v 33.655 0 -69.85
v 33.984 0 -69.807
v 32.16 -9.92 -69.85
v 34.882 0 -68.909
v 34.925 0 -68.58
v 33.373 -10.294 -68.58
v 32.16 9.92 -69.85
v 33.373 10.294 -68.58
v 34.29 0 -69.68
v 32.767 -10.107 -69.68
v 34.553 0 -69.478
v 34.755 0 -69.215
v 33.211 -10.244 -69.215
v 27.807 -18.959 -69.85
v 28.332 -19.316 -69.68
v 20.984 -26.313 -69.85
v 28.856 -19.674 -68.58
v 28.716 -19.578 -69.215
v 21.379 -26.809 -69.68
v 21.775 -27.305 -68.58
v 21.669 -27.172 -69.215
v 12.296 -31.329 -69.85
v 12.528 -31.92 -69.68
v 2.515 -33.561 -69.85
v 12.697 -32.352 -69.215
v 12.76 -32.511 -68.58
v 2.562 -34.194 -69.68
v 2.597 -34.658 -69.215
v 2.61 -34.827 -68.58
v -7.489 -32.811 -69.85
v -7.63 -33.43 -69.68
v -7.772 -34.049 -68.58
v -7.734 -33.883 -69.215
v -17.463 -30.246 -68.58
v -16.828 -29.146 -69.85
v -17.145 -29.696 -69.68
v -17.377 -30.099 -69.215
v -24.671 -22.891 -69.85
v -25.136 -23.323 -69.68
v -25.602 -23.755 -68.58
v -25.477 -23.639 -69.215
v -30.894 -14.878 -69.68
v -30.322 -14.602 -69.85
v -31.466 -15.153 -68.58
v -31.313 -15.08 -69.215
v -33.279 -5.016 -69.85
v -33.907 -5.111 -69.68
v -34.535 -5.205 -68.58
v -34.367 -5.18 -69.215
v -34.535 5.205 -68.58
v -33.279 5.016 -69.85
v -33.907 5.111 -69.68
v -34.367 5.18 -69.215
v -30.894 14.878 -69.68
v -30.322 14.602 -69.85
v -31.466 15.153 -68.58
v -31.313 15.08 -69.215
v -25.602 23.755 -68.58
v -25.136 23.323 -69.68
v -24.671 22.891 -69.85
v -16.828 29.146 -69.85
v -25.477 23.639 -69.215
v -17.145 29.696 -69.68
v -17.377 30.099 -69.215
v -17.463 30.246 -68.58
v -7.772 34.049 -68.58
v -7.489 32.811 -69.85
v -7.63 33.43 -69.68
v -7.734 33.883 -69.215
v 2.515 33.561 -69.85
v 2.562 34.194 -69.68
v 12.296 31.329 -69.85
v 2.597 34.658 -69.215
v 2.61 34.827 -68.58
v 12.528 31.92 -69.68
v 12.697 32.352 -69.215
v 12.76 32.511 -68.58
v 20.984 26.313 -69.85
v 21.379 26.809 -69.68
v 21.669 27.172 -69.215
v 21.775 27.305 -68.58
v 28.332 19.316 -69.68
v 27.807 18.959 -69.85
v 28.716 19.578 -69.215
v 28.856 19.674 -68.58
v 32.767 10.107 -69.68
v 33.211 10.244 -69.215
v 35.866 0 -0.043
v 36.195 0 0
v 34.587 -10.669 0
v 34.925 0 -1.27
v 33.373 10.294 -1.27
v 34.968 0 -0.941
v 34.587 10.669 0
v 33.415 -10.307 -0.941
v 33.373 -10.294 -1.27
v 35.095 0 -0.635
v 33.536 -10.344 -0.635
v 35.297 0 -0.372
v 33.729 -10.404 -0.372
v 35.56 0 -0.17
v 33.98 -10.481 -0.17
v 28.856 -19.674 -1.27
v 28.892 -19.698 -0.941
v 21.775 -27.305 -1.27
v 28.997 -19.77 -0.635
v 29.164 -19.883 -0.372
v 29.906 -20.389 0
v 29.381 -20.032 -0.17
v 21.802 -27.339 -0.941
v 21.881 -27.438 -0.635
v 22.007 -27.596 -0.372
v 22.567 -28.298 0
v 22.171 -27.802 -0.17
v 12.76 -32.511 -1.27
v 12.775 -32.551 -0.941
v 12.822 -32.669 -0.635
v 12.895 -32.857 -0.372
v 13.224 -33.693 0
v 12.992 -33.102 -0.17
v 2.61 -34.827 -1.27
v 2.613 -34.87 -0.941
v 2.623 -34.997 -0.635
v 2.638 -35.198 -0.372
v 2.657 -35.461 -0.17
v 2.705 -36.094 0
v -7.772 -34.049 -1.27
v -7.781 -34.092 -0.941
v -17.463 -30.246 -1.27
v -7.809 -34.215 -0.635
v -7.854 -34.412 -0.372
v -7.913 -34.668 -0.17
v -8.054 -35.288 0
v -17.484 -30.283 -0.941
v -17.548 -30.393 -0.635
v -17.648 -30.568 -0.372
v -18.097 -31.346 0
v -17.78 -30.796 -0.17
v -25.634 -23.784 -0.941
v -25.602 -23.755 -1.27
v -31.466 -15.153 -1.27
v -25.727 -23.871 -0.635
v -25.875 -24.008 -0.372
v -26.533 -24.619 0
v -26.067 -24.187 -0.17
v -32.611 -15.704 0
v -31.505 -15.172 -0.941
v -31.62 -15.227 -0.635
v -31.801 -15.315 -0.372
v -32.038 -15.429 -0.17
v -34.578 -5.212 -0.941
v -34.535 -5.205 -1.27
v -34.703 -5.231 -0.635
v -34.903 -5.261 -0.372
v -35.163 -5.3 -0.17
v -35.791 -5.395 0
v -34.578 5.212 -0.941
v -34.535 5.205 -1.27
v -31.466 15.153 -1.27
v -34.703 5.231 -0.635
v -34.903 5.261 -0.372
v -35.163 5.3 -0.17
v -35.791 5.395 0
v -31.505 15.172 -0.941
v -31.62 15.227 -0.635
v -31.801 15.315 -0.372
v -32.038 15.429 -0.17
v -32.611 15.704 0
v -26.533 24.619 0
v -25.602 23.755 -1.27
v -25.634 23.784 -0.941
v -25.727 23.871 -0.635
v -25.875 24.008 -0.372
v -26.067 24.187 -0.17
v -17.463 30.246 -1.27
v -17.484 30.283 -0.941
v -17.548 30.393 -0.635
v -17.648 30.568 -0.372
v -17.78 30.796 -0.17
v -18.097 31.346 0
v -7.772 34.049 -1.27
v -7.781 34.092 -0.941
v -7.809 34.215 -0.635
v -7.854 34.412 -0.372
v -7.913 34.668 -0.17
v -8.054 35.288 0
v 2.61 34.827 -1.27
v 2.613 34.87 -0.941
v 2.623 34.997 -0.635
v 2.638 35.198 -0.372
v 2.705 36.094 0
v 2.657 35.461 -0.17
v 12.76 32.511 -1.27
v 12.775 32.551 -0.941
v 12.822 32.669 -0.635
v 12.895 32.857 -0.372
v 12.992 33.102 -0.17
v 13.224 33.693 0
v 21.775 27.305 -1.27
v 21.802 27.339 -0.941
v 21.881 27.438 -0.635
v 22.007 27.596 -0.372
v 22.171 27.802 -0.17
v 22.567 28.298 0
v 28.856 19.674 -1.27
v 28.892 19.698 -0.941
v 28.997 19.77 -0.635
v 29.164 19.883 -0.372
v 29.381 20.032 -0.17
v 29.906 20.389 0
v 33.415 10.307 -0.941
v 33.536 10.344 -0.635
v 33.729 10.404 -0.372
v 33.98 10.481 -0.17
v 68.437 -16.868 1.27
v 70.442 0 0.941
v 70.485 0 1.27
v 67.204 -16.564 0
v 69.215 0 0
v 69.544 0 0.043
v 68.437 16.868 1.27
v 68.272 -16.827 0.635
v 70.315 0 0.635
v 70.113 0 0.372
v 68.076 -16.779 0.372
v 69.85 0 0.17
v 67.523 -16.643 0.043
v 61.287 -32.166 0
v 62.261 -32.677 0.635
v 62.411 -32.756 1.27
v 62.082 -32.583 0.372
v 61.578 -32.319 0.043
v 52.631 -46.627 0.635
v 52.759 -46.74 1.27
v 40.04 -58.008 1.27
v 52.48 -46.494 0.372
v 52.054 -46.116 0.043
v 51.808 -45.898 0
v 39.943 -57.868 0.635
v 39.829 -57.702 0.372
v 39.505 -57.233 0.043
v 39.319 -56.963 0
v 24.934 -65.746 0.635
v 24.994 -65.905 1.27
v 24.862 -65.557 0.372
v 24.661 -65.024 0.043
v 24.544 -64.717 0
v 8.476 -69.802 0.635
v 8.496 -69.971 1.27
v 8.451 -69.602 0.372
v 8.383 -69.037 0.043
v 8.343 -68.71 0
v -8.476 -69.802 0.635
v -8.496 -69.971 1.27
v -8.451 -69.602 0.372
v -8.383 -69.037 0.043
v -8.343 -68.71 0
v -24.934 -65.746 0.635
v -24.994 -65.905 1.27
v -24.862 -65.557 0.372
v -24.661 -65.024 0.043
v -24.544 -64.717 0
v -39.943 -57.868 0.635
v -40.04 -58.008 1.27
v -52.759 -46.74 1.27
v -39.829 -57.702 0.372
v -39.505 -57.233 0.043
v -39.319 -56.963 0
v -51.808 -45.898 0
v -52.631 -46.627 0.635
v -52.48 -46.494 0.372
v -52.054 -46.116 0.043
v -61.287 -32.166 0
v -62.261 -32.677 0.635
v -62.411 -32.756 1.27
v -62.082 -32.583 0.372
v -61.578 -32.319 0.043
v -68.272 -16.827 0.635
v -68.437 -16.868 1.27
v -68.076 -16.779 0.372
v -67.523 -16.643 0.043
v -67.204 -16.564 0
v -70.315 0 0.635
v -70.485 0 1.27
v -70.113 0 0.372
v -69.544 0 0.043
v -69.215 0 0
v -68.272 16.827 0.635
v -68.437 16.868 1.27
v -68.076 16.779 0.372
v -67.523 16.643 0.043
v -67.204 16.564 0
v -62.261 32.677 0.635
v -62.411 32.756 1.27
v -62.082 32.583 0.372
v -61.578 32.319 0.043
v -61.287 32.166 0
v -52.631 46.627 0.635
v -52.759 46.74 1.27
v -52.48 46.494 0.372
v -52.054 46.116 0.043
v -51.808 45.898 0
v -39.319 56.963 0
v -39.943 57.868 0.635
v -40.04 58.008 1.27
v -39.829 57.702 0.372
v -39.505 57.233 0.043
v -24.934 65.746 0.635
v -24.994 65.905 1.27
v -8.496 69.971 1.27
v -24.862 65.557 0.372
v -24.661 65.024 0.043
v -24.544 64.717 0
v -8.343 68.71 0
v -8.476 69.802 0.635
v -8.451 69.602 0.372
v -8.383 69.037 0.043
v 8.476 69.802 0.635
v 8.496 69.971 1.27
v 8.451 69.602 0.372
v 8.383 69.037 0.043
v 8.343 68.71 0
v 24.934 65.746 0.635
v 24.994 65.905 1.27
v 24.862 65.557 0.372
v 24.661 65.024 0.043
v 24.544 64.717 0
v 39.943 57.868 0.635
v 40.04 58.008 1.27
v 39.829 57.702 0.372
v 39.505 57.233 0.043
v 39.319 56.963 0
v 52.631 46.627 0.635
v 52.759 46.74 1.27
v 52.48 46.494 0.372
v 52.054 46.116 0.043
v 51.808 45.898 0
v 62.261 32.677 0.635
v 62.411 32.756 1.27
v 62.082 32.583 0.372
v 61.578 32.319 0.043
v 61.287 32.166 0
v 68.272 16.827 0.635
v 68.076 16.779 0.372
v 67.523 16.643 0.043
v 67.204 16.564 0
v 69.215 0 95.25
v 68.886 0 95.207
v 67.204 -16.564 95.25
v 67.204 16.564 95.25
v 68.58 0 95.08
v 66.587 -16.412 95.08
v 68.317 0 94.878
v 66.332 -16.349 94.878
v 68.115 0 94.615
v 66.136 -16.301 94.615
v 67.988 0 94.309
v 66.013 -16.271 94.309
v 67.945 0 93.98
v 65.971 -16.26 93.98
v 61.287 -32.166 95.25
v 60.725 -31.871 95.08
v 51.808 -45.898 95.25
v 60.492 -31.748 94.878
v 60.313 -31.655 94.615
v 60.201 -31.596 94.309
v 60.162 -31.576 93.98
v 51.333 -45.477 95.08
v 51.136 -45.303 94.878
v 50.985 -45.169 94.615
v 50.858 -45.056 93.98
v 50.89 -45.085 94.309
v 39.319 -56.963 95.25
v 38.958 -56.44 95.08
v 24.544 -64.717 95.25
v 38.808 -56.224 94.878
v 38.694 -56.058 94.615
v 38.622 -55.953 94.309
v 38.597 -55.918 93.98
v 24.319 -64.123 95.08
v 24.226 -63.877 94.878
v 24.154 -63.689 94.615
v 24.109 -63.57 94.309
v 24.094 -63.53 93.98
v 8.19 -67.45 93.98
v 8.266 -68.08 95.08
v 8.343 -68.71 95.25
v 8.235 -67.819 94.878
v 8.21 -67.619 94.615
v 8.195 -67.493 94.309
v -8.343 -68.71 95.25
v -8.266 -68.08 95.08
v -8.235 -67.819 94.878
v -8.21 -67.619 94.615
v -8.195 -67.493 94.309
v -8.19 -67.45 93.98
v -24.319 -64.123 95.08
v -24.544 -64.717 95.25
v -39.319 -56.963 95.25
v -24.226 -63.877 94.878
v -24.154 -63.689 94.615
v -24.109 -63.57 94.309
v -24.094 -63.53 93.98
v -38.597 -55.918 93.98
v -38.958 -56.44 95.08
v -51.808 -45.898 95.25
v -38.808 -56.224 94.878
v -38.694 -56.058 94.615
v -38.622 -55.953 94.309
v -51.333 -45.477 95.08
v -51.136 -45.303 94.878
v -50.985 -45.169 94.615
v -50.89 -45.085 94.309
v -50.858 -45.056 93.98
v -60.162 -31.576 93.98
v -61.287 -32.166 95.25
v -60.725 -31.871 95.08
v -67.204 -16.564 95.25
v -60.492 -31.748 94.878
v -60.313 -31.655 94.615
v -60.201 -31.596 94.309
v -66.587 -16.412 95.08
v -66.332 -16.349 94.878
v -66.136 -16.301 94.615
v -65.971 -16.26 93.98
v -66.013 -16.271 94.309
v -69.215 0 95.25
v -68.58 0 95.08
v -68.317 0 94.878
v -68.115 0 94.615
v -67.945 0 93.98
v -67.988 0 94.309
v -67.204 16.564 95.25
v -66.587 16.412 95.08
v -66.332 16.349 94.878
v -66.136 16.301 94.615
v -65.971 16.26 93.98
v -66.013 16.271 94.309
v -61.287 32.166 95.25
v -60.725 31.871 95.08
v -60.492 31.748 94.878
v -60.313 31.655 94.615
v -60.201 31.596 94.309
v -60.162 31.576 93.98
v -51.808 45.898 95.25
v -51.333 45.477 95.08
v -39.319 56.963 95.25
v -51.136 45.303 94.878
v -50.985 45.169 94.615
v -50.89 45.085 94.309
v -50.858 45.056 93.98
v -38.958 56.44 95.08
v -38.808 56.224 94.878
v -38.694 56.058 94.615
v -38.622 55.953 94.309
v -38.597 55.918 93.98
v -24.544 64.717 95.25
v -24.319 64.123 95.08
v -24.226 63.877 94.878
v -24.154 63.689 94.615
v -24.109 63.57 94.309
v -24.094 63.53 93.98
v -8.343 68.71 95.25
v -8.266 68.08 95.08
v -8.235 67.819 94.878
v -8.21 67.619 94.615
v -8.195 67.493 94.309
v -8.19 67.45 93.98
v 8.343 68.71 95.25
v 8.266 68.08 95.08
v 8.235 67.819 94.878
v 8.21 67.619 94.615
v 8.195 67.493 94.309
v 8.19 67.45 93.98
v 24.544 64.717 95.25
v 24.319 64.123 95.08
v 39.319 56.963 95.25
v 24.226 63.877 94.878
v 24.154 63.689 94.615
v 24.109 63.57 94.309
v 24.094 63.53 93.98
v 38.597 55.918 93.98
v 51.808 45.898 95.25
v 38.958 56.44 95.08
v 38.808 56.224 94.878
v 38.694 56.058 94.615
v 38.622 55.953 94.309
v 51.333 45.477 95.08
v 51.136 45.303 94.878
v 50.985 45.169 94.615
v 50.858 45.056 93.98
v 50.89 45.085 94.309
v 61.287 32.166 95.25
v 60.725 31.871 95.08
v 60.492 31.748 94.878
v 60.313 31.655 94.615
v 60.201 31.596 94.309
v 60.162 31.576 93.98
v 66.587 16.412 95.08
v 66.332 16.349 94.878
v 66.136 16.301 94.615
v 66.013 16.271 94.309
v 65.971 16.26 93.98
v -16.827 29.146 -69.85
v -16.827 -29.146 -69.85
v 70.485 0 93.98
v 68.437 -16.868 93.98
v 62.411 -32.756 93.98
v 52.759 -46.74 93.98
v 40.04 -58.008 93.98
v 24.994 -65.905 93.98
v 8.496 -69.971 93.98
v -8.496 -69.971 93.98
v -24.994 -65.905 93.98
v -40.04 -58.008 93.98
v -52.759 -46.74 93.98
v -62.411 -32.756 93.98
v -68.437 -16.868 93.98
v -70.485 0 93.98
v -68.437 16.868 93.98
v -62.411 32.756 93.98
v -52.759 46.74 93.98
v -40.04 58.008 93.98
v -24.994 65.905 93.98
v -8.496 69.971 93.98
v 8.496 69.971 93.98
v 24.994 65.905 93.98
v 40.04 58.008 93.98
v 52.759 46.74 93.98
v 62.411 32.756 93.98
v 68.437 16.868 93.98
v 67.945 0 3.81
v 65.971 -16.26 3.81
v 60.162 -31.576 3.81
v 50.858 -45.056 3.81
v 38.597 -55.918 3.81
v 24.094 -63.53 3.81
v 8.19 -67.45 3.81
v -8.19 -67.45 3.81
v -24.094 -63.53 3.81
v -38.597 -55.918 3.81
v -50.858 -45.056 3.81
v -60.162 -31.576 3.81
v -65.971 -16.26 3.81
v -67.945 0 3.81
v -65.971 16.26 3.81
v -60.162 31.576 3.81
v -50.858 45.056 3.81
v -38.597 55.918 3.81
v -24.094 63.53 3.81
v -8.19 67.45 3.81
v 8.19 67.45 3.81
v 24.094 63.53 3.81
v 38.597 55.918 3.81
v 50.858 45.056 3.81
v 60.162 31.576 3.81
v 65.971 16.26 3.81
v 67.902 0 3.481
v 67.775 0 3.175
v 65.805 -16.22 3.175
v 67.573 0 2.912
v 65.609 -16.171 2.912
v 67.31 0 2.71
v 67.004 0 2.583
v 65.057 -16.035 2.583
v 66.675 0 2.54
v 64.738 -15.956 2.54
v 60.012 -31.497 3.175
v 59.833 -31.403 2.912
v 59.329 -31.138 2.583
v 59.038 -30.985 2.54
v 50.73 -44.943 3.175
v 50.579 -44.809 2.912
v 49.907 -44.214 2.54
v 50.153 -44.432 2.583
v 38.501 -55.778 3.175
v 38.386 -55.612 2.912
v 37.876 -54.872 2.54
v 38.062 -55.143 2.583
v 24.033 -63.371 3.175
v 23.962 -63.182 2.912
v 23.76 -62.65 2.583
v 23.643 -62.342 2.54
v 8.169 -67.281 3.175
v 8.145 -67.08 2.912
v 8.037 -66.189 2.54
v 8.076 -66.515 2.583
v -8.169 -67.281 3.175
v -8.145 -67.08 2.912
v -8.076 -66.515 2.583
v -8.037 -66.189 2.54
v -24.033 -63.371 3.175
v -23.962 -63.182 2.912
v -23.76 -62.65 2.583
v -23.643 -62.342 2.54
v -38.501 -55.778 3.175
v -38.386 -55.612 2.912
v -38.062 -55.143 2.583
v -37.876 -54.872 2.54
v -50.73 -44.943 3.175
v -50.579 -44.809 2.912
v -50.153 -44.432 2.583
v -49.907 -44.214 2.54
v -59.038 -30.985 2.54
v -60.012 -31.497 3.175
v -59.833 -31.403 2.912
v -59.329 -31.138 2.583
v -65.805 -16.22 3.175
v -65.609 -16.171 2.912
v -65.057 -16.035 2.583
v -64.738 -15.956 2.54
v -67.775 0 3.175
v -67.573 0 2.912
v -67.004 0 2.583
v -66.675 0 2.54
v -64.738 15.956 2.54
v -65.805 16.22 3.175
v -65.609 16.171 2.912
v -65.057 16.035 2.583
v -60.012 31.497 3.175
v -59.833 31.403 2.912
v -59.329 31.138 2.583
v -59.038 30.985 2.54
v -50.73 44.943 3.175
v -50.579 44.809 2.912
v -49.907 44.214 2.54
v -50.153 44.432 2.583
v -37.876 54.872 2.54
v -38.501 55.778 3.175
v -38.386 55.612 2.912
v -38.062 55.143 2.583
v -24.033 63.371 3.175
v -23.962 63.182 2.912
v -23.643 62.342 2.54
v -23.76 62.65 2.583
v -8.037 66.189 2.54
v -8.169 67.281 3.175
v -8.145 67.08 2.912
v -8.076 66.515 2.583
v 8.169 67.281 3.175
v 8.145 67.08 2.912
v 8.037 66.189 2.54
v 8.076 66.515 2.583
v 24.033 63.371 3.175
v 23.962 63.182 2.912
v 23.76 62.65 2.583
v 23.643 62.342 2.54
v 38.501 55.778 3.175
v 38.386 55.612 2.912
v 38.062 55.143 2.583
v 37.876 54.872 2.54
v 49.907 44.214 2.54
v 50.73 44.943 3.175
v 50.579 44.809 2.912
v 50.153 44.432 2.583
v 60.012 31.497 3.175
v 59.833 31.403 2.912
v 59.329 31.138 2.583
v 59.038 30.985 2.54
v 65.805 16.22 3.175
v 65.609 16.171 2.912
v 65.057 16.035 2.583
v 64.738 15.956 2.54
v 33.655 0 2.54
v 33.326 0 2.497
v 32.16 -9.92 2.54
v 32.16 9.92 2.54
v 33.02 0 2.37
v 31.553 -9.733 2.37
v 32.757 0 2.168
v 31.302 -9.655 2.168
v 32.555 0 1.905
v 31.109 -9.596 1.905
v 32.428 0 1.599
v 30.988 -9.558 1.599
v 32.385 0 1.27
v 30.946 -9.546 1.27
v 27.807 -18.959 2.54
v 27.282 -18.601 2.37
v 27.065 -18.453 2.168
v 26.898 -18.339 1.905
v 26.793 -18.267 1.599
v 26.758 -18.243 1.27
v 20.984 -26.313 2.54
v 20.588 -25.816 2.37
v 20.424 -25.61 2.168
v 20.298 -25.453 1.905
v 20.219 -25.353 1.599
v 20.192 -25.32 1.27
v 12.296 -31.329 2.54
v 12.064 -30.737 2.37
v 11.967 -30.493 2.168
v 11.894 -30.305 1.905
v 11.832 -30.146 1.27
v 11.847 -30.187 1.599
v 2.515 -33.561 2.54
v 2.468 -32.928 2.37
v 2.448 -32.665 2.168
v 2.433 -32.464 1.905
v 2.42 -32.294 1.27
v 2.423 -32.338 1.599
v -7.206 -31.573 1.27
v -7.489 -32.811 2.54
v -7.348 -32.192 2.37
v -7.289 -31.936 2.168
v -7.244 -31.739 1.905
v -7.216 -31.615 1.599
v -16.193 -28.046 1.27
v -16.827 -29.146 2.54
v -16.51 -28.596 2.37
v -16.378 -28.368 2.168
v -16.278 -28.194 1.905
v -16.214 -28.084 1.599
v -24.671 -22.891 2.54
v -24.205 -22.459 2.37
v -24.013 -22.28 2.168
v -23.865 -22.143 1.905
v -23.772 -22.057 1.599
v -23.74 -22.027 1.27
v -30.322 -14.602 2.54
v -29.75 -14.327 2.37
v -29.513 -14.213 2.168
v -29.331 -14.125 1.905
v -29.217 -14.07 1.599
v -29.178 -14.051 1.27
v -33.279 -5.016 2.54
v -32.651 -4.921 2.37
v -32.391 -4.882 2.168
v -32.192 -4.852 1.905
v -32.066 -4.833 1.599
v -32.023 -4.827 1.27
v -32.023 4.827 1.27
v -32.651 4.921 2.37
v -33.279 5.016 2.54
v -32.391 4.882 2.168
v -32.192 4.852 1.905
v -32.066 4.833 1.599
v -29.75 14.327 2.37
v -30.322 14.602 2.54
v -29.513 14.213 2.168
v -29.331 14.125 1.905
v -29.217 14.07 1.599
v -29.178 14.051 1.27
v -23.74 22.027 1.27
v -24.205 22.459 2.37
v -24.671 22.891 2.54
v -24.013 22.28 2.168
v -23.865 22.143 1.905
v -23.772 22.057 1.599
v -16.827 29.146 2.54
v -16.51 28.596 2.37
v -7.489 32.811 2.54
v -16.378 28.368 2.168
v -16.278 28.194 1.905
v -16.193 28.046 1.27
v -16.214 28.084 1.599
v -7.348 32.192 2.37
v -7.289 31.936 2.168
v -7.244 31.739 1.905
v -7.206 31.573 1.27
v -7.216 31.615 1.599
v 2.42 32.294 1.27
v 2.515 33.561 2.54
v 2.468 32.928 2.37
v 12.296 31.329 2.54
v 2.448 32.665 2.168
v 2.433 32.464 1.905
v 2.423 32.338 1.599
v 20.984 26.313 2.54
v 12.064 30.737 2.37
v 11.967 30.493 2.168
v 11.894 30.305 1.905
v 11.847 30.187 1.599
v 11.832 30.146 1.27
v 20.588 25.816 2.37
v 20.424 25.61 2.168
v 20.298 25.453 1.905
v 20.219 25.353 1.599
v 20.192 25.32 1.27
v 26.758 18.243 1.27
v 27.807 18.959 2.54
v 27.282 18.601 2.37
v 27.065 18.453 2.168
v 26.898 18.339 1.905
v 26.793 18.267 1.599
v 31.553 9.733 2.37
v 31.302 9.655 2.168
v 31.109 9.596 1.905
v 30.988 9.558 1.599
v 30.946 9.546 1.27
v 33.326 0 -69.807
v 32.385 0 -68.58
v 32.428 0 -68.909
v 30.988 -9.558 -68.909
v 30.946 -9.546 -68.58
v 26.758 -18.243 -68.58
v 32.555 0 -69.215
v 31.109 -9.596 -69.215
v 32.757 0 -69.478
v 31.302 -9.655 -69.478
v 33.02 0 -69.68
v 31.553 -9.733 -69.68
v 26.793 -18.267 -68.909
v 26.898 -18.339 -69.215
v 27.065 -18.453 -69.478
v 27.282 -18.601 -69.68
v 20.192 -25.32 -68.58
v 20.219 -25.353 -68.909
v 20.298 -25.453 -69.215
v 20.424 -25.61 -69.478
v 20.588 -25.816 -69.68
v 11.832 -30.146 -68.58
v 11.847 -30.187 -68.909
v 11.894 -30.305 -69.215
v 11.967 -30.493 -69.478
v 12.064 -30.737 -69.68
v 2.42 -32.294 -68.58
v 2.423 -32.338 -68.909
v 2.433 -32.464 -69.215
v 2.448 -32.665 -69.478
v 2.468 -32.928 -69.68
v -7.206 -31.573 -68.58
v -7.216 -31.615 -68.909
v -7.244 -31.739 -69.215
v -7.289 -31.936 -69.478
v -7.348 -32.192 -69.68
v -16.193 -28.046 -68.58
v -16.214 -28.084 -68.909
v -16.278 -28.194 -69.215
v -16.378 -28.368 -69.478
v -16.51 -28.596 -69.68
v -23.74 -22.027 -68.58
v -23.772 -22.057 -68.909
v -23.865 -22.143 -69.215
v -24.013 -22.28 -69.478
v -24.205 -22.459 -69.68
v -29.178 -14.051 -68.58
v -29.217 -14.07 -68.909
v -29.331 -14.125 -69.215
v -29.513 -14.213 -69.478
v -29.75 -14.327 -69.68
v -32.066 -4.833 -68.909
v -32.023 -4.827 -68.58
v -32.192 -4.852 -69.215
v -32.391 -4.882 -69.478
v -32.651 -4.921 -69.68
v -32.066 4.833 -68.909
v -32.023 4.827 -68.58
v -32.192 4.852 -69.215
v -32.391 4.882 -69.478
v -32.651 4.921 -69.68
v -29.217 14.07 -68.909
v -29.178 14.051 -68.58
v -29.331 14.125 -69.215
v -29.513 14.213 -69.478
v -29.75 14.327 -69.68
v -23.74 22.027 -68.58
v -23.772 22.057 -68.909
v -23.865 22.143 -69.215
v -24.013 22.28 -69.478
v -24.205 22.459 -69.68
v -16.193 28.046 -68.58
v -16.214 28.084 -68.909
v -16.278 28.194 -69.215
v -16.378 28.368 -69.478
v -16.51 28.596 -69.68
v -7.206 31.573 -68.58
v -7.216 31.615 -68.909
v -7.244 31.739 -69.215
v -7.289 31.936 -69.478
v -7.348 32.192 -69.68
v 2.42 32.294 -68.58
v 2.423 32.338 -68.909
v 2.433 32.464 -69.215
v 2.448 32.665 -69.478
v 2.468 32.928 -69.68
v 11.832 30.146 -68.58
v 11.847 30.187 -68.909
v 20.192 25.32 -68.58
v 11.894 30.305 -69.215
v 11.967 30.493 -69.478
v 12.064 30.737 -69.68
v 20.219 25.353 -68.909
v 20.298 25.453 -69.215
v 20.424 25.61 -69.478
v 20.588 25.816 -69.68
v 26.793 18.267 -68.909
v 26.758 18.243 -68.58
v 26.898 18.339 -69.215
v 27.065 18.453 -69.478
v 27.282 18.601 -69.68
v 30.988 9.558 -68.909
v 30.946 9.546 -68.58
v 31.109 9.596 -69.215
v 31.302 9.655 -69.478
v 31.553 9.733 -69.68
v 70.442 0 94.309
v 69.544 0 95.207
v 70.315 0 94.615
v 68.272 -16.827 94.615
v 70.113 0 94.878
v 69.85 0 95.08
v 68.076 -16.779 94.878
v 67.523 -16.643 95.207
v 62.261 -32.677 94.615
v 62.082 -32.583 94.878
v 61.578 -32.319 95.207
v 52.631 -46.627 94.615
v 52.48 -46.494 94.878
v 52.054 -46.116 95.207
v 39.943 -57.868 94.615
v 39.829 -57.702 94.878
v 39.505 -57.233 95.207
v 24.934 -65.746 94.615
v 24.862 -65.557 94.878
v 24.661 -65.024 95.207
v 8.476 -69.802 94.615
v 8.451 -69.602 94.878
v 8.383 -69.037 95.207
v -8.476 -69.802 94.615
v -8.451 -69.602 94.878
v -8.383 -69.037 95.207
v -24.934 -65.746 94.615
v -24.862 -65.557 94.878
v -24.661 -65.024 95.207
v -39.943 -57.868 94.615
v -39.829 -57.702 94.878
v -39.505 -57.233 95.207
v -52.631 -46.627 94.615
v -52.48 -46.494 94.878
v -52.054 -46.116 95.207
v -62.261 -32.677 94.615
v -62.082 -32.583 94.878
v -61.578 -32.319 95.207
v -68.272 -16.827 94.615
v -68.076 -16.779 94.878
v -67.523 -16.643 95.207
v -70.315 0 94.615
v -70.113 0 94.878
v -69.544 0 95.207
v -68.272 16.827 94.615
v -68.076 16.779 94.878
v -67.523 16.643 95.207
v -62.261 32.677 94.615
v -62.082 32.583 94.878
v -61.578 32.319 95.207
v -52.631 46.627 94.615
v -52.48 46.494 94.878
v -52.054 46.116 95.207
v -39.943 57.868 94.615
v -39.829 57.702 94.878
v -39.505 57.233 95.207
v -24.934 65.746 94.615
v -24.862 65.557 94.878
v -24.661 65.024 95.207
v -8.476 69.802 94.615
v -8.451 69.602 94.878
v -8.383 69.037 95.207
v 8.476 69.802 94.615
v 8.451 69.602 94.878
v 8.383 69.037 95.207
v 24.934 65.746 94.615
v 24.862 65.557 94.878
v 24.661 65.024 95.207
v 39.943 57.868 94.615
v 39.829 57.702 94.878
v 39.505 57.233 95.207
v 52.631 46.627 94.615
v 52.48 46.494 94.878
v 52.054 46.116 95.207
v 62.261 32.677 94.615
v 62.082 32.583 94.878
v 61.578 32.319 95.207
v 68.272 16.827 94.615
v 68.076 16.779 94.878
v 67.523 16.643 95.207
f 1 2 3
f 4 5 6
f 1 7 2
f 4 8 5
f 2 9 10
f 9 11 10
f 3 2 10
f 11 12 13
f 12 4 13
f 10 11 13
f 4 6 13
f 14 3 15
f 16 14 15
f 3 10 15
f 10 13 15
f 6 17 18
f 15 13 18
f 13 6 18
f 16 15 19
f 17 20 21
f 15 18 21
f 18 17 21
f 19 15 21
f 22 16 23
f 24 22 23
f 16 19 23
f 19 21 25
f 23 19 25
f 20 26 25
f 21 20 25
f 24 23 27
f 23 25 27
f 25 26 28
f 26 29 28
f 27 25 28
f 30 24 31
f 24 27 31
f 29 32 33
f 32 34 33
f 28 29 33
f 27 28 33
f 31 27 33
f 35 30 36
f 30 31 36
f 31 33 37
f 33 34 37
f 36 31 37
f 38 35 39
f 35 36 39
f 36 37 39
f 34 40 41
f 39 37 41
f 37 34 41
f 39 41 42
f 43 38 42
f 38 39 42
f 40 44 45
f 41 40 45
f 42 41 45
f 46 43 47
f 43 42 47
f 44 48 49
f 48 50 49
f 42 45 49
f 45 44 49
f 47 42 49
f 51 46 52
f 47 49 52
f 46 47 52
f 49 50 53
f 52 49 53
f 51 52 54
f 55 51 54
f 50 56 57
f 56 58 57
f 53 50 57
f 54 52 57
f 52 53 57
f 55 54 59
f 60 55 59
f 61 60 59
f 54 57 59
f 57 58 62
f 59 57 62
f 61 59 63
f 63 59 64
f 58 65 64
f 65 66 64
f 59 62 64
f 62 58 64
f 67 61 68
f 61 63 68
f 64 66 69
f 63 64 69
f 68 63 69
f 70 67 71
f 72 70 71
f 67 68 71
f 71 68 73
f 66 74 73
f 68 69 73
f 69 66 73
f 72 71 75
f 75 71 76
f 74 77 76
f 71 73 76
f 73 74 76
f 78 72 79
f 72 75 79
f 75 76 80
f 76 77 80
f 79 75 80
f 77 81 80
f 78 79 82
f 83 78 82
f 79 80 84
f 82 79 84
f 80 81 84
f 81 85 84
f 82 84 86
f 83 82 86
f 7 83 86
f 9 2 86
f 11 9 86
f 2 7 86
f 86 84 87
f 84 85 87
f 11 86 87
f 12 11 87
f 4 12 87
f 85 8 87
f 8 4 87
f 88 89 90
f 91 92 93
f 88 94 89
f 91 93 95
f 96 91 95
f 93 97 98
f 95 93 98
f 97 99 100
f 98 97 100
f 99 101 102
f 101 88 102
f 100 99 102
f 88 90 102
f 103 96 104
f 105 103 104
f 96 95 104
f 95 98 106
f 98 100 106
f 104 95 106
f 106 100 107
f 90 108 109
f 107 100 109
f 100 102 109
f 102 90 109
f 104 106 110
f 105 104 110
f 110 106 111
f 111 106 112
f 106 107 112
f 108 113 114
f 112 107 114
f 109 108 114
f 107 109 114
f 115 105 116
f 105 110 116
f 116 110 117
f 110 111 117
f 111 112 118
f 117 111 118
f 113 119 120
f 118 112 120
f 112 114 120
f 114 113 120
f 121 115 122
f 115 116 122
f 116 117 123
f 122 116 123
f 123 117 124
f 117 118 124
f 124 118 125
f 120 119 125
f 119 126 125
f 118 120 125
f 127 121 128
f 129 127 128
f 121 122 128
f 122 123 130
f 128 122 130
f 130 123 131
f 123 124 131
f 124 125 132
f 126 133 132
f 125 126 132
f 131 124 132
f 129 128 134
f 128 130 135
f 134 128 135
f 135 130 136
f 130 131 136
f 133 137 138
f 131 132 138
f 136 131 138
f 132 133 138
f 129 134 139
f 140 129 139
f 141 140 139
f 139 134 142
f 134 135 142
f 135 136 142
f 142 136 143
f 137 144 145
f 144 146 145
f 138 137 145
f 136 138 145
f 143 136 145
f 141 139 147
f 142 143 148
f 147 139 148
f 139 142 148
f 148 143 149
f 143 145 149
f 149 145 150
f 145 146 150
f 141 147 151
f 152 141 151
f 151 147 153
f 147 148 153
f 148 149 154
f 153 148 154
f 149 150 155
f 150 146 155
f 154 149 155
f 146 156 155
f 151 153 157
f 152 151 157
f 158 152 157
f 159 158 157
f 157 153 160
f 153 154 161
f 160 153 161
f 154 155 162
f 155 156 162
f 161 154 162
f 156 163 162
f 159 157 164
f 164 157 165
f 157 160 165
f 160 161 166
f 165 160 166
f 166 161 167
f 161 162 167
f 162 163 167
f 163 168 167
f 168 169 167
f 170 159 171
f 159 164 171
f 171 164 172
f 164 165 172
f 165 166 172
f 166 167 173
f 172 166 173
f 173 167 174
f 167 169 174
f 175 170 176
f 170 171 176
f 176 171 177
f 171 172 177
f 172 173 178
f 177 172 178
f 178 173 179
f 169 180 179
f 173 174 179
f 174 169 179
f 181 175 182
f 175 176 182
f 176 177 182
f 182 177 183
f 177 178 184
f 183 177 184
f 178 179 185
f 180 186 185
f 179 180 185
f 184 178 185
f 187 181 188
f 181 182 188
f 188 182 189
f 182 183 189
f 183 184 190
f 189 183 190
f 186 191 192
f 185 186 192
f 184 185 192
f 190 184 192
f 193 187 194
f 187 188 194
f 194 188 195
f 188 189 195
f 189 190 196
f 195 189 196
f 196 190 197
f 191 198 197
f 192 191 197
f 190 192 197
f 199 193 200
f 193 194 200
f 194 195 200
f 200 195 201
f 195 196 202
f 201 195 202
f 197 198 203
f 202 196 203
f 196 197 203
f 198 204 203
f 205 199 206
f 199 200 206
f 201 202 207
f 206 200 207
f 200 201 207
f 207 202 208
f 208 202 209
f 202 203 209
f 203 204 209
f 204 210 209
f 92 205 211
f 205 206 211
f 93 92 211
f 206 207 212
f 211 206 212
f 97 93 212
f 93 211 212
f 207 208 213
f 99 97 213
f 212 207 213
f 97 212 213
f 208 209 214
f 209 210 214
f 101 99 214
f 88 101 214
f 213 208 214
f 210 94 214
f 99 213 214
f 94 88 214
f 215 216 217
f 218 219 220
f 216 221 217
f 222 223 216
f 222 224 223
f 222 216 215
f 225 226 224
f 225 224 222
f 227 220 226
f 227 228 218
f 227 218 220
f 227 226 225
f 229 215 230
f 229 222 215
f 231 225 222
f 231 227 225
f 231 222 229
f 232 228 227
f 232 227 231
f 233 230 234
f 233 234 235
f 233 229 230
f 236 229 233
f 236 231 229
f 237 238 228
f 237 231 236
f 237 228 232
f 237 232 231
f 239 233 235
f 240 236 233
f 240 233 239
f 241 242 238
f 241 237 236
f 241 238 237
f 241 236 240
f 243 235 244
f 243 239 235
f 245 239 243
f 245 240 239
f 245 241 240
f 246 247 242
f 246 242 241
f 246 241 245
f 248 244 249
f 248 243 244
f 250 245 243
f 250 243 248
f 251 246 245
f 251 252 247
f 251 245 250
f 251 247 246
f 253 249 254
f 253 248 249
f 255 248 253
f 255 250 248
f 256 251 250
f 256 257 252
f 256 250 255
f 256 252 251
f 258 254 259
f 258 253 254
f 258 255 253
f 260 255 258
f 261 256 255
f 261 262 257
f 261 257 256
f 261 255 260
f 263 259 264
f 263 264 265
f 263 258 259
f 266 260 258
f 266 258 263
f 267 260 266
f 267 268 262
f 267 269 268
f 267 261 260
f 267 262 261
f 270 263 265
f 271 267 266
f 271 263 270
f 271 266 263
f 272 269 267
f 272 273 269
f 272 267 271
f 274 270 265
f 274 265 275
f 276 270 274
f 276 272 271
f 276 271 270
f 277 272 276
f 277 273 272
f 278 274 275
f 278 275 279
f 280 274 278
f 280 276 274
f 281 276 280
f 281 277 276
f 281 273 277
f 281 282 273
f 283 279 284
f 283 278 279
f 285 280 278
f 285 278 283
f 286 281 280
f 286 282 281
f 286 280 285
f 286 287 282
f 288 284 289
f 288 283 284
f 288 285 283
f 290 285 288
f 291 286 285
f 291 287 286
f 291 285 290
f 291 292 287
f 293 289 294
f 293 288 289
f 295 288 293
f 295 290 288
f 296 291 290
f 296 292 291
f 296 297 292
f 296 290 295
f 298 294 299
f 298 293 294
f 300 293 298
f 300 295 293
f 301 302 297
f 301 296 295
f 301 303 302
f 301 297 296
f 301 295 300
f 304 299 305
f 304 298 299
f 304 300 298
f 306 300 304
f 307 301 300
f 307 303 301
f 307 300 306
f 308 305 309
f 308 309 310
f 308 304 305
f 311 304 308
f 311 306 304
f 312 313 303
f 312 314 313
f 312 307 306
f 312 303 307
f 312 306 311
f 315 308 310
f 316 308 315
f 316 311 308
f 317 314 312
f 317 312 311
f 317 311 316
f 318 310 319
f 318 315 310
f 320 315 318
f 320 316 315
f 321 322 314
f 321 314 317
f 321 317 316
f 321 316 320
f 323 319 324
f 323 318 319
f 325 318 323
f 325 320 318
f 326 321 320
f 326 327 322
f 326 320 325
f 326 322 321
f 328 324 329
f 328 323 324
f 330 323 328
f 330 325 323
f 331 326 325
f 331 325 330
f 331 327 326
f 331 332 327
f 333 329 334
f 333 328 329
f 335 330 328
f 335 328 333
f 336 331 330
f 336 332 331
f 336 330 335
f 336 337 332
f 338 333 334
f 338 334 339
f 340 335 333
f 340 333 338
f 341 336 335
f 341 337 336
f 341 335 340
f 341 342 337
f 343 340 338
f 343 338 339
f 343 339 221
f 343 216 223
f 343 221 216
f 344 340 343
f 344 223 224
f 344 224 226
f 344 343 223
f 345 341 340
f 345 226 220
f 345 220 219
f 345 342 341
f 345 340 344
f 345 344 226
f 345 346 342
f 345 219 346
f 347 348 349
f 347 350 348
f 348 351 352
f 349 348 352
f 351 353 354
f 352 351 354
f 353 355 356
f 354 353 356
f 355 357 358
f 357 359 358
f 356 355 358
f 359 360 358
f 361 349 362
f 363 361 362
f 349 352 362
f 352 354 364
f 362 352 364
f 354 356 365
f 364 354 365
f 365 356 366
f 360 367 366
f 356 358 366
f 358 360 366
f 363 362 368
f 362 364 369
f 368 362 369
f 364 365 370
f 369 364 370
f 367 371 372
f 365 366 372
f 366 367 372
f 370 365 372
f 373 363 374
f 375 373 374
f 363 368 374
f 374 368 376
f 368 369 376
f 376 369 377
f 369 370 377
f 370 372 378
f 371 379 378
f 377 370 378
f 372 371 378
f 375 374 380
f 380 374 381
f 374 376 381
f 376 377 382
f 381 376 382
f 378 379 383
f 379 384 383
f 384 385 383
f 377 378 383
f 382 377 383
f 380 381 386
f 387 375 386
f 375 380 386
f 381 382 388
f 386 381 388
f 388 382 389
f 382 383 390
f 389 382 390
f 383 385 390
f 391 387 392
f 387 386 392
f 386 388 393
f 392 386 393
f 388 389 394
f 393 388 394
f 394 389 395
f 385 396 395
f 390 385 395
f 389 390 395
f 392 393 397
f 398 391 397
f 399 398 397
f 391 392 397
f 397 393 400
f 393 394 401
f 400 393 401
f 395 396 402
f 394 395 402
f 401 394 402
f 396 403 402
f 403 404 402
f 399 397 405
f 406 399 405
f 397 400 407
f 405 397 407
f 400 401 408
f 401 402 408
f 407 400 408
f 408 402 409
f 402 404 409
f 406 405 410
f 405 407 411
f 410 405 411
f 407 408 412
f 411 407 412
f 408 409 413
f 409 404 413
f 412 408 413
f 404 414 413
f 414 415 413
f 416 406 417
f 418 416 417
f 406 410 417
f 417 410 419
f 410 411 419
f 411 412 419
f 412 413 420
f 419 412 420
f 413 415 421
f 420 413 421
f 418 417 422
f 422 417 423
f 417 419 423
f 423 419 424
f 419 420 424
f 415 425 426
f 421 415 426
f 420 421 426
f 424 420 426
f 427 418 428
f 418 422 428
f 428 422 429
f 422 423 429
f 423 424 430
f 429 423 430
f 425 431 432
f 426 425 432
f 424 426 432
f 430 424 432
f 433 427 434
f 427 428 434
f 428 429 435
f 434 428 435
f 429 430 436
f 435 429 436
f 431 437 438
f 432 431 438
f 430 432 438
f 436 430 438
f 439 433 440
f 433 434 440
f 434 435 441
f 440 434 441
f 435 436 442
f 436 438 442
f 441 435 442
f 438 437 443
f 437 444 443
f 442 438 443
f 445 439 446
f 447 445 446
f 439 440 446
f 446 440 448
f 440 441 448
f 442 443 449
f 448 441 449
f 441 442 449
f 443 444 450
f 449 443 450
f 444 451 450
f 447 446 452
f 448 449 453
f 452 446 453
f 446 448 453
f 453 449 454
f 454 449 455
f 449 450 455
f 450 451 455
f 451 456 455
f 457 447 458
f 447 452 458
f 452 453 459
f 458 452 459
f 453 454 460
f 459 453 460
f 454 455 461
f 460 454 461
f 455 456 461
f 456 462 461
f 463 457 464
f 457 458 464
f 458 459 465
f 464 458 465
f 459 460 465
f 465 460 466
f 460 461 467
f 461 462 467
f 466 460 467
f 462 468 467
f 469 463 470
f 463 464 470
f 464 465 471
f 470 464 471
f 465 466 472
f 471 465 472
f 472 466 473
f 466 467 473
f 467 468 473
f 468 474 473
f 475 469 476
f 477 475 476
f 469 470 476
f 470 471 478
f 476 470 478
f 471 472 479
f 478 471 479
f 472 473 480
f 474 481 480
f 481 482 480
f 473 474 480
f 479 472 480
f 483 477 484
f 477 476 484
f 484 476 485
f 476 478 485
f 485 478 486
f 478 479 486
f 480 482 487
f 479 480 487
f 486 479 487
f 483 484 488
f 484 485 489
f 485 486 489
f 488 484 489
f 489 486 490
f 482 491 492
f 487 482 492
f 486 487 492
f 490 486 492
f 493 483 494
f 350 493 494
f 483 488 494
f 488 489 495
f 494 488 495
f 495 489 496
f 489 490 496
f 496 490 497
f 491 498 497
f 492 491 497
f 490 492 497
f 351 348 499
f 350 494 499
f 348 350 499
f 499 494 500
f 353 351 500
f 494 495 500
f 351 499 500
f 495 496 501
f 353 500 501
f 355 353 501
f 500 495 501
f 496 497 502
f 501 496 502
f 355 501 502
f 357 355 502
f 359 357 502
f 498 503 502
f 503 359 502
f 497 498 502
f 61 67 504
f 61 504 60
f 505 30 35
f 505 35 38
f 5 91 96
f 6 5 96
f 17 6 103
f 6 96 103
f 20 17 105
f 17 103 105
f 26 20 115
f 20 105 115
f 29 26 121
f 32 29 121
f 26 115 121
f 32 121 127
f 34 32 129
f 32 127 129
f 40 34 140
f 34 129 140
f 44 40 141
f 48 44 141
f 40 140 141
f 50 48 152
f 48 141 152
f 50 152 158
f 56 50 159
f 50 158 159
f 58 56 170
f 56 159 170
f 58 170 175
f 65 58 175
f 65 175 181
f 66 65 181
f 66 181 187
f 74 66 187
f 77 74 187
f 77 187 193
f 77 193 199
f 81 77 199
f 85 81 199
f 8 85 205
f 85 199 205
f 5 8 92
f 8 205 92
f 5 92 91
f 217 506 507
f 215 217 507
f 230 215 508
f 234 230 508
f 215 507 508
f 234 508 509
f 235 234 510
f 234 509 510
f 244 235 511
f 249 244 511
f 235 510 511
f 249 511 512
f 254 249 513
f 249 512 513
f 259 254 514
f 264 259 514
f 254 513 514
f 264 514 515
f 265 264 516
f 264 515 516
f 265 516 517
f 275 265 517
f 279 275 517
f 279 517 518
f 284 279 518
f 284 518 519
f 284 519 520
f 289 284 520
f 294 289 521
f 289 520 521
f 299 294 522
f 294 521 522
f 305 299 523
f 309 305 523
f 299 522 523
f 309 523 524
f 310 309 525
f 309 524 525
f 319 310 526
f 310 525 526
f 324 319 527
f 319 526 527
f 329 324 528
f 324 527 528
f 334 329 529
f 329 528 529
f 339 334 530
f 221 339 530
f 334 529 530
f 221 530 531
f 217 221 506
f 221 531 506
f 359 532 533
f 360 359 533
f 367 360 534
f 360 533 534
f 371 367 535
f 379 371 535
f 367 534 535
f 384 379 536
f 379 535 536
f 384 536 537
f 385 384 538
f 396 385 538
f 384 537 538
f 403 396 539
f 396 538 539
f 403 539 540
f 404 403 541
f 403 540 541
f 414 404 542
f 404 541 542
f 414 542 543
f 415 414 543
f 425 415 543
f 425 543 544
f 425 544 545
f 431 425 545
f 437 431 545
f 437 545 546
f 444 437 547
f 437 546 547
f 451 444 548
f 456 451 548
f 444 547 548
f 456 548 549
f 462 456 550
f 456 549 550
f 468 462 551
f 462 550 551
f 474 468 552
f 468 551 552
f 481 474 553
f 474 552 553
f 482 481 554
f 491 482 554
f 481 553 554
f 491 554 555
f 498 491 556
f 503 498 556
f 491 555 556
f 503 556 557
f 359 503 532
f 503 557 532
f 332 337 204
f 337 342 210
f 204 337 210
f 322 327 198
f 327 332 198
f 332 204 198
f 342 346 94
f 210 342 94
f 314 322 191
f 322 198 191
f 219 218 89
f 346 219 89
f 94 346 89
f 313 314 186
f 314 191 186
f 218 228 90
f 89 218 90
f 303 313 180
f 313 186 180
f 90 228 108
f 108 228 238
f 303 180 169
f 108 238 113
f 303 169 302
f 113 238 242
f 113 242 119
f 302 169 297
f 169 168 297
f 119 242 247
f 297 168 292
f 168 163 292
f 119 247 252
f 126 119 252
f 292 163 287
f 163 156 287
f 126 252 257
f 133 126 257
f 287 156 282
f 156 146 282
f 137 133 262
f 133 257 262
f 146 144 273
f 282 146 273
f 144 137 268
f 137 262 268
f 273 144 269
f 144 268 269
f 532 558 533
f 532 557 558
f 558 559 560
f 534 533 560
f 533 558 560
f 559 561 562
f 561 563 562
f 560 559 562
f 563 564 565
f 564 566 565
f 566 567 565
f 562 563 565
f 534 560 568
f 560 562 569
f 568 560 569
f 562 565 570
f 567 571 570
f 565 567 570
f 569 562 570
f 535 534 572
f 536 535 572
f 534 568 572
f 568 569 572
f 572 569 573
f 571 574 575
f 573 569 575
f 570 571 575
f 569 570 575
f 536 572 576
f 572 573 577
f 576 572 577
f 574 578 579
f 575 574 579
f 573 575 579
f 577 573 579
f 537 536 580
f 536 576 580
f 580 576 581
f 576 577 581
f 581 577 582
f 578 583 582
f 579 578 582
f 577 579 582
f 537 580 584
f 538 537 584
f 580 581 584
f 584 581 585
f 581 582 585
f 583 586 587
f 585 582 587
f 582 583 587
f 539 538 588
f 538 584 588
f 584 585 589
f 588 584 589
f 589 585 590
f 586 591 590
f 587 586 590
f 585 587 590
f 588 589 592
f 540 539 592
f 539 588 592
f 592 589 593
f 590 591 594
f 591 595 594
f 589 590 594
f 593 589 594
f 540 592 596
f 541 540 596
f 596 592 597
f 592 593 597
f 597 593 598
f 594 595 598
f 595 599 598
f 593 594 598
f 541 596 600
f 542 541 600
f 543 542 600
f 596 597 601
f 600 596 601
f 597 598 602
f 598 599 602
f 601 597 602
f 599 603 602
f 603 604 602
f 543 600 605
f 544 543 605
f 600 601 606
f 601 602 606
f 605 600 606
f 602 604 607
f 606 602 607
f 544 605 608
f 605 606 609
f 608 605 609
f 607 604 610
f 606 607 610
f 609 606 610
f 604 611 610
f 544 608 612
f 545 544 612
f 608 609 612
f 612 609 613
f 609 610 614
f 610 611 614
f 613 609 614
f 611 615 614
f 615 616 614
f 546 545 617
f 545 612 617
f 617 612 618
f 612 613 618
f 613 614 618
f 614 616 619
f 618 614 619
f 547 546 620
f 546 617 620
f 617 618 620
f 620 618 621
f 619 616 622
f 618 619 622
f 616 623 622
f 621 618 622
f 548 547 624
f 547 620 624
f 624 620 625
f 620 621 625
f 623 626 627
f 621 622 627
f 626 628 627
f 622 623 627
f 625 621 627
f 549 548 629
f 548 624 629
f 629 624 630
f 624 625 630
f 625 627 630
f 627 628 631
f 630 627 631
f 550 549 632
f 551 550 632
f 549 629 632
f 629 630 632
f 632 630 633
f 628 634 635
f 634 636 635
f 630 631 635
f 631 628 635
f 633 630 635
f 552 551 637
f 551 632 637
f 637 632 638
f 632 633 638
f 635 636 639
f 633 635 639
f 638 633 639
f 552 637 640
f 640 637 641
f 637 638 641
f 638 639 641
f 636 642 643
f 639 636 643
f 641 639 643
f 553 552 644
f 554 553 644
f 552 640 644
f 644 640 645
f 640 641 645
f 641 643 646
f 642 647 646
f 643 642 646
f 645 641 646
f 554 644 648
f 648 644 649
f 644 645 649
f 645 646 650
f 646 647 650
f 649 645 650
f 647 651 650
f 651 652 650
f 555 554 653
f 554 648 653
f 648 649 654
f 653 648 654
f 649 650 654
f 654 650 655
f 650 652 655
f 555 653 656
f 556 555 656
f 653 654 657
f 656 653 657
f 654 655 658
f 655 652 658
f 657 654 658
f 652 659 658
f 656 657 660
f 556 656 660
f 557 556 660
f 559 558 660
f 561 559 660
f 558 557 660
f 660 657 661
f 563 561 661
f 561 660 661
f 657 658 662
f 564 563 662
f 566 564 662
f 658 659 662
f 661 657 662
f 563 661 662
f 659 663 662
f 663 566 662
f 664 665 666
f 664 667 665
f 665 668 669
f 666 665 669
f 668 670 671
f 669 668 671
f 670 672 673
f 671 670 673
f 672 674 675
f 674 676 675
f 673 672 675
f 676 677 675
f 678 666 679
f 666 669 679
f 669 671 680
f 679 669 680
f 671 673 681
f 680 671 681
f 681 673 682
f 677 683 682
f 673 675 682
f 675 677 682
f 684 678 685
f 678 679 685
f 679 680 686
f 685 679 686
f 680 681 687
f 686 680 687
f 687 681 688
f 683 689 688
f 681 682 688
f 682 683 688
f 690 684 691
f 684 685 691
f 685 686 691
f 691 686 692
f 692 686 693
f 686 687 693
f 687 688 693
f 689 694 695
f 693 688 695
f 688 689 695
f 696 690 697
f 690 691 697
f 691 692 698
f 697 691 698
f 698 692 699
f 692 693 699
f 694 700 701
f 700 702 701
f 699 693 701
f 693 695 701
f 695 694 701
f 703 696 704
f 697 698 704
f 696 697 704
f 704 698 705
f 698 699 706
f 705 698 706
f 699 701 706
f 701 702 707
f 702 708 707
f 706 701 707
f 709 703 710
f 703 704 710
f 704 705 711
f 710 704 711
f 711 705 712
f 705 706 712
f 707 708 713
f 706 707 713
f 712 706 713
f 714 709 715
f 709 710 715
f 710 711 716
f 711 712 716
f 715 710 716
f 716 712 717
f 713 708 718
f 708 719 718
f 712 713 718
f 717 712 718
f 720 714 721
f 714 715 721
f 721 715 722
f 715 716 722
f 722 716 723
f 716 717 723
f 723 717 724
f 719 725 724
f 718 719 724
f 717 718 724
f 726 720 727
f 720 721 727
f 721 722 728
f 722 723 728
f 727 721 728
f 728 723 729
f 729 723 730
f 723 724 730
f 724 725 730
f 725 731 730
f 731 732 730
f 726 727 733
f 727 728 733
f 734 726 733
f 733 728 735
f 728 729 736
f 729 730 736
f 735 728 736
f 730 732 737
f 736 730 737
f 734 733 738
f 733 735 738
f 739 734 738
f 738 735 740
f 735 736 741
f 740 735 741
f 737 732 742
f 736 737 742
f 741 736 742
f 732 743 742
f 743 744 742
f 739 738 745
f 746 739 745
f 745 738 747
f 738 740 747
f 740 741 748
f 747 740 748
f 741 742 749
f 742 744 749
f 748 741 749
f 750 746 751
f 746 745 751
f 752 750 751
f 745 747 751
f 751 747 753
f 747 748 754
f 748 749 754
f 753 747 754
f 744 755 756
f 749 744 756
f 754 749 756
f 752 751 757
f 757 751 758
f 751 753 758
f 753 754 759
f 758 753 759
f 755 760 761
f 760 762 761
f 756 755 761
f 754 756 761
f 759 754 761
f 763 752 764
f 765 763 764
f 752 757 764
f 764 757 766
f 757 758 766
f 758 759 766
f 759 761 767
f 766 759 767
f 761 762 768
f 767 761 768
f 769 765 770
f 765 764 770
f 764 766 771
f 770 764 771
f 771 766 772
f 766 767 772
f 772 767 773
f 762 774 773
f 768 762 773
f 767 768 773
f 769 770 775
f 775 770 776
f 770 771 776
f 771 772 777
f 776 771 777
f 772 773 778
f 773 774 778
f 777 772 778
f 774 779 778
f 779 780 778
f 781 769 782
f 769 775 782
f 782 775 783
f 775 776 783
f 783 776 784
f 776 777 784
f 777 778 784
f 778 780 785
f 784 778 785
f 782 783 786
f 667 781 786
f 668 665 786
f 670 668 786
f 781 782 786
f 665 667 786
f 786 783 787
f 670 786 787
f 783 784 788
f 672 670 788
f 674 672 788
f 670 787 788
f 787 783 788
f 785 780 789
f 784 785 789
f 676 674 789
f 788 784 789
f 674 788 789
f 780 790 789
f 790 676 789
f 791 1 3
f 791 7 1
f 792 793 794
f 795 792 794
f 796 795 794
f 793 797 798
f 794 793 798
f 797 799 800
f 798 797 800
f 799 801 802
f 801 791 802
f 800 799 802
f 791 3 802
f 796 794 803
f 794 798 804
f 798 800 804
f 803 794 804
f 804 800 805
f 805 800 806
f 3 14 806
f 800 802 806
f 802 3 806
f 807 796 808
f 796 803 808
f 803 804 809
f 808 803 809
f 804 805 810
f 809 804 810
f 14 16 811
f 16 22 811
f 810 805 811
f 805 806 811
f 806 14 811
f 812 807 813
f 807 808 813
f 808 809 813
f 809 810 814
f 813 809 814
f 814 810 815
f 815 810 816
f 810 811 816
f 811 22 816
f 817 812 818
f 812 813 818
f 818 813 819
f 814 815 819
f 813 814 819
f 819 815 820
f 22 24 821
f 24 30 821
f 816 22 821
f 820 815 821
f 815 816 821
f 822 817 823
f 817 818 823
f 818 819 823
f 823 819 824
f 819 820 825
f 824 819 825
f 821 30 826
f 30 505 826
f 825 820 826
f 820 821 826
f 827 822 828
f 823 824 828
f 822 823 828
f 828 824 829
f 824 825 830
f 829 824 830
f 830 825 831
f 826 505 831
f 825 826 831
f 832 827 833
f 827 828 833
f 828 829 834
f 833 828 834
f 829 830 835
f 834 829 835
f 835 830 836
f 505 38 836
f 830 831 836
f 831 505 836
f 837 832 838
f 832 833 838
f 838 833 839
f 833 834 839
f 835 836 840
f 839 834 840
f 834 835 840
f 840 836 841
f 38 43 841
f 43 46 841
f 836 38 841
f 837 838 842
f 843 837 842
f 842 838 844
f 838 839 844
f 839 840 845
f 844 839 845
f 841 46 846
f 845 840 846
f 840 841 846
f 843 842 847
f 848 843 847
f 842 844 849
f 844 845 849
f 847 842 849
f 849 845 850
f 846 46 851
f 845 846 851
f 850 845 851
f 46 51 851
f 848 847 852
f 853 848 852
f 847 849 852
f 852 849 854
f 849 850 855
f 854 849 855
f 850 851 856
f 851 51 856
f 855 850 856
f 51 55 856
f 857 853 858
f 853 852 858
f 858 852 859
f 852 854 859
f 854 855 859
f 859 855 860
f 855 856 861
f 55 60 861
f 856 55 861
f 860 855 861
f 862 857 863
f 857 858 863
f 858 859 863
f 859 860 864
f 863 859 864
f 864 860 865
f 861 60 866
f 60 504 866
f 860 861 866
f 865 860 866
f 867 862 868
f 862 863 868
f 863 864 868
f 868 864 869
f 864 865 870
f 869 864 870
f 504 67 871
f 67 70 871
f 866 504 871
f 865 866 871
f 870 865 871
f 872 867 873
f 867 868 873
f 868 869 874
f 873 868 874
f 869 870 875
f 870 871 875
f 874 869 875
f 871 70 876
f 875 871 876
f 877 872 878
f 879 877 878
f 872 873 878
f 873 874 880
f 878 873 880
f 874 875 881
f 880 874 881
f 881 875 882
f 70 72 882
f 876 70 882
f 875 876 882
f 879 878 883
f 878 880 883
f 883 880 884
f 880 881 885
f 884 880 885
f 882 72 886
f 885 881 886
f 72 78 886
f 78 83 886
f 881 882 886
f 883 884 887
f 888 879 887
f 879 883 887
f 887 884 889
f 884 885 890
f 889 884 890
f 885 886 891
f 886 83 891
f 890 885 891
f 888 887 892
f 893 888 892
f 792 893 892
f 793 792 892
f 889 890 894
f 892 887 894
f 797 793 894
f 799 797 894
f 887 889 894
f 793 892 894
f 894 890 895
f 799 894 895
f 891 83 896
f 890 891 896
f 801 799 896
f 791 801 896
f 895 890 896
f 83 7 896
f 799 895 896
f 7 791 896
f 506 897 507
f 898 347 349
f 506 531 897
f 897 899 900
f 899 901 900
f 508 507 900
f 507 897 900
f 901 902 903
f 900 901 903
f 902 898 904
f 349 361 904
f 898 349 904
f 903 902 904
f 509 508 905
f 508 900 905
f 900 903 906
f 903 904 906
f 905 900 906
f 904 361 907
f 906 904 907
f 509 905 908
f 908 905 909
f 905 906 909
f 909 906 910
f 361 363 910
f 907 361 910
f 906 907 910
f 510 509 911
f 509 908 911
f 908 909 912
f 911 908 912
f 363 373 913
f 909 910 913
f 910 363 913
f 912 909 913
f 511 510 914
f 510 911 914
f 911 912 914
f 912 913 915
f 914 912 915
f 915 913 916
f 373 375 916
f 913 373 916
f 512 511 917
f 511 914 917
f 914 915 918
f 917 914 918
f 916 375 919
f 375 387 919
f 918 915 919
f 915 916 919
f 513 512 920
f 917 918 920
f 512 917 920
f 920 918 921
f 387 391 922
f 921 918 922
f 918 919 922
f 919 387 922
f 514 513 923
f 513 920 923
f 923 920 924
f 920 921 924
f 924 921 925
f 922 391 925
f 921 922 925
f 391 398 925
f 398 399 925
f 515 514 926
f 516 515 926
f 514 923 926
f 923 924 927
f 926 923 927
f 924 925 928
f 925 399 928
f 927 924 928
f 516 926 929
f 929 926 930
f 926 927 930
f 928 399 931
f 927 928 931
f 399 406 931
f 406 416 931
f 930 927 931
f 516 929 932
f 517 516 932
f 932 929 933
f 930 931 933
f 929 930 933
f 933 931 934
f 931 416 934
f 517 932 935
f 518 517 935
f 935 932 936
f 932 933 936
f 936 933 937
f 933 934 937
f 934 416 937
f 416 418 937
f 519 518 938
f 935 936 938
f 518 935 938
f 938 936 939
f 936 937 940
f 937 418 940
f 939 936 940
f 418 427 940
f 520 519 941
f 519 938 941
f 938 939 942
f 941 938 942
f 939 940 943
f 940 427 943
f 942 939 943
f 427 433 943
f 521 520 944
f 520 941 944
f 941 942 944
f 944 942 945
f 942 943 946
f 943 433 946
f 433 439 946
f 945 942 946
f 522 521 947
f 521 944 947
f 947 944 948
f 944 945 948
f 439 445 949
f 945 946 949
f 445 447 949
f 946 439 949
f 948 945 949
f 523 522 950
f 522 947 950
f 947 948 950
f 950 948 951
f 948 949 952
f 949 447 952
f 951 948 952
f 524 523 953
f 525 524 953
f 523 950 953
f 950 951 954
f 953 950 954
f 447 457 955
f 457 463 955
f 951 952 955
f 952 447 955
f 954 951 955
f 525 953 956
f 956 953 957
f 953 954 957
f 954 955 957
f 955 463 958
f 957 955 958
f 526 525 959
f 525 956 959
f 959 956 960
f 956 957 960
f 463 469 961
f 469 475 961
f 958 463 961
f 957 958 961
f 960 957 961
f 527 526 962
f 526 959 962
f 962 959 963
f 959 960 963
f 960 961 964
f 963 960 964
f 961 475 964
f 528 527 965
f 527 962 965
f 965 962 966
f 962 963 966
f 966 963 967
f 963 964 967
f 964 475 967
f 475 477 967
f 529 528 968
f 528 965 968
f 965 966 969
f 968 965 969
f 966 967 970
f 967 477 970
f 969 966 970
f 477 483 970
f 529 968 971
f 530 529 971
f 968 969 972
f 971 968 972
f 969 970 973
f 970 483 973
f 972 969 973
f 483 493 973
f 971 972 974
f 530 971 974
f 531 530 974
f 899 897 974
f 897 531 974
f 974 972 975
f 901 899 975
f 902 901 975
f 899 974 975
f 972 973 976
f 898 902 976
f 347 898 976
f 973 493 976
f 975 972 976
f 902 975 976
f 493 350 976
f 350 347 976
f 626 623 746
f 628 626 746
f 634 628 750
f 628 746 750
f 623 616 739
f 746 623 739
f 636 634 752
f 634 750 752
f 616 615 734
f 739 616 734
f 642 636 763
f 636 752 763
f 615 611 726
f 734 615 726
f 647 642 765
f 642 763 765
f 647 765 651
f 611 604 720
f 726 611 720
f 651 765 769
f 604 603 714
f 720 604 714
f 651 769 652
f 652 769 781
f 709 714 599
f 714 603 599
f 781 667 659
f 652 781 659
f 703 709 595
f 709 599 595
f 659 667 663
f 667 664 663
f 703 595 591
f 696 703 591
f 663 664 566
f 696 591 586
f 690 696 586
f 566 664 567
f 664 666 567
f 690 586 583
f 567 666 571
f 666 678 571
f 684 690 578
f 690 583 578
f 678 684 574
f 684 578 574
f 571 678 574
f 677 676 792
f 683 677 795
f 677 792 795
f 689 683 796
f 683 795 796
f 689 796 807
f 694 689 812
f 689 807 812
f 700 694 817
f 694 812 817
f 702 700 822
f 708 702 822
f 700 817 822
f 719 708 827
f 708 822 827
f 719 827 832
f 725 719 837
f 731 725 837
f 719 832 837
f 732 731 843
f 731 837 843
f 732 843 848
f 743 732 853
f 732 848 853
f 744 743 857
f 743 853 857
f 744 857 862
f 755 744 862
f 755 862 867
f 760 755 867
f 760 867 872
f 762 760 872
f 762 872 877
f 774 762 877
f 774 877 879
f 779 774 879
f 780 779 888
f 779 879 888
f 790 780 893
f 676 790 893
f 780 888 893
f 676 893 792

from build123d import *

# Parameters (mm, degrees)
F0_W = 33.02
F0_H = 2.54
F2_R = 1.26999


# Not quite as in the source:
# - a fillet or chamfer is up to 0.001 mm smaller than in the source, because OpenCascade refuses the exact size


with BuildPart() as f1:
    # F0 (on Front) → F1 (revolve)
    with BuildSketch(Plane.XZ):
        Polygon((70.485, 0), (70.485, 95.25), (67.945, 95.25), (67.945, 2.54), (67.945, 0), align=None)
        with Locations((51.435, 1.27)):
            Rectangle(F0_W, F0_H)
        Polygon((34.925, 0), (34.925, 2.54), (32.385, 2.54), (32.385, -69.85), (34.925, -69.85), align=None)
    revolve(axis=Axis((0, 0, -3.7589259446), (0, 0, -1)))

    # F2 (radius 1.27 in the source; OpenCascade refuses exactly that, so slightly less here)
    f2_edges = [f1.edges().sort_by_distance(p)[0] for p in [
        (-67.945, 0, 95.25),
        (-70.485, 0, 95.25),
        (-67.945, 0, 2.54),
        (-70.485, 0, 0),
        (-32.385, 0, -69.85),
        (-32.385, 0, 2.54),
        (-34.925, 0, -69.85),
        (-34.925, 0, 0),
    ]]
    fillet(f2_edges, radius=F2_R)


solid = f1.part
